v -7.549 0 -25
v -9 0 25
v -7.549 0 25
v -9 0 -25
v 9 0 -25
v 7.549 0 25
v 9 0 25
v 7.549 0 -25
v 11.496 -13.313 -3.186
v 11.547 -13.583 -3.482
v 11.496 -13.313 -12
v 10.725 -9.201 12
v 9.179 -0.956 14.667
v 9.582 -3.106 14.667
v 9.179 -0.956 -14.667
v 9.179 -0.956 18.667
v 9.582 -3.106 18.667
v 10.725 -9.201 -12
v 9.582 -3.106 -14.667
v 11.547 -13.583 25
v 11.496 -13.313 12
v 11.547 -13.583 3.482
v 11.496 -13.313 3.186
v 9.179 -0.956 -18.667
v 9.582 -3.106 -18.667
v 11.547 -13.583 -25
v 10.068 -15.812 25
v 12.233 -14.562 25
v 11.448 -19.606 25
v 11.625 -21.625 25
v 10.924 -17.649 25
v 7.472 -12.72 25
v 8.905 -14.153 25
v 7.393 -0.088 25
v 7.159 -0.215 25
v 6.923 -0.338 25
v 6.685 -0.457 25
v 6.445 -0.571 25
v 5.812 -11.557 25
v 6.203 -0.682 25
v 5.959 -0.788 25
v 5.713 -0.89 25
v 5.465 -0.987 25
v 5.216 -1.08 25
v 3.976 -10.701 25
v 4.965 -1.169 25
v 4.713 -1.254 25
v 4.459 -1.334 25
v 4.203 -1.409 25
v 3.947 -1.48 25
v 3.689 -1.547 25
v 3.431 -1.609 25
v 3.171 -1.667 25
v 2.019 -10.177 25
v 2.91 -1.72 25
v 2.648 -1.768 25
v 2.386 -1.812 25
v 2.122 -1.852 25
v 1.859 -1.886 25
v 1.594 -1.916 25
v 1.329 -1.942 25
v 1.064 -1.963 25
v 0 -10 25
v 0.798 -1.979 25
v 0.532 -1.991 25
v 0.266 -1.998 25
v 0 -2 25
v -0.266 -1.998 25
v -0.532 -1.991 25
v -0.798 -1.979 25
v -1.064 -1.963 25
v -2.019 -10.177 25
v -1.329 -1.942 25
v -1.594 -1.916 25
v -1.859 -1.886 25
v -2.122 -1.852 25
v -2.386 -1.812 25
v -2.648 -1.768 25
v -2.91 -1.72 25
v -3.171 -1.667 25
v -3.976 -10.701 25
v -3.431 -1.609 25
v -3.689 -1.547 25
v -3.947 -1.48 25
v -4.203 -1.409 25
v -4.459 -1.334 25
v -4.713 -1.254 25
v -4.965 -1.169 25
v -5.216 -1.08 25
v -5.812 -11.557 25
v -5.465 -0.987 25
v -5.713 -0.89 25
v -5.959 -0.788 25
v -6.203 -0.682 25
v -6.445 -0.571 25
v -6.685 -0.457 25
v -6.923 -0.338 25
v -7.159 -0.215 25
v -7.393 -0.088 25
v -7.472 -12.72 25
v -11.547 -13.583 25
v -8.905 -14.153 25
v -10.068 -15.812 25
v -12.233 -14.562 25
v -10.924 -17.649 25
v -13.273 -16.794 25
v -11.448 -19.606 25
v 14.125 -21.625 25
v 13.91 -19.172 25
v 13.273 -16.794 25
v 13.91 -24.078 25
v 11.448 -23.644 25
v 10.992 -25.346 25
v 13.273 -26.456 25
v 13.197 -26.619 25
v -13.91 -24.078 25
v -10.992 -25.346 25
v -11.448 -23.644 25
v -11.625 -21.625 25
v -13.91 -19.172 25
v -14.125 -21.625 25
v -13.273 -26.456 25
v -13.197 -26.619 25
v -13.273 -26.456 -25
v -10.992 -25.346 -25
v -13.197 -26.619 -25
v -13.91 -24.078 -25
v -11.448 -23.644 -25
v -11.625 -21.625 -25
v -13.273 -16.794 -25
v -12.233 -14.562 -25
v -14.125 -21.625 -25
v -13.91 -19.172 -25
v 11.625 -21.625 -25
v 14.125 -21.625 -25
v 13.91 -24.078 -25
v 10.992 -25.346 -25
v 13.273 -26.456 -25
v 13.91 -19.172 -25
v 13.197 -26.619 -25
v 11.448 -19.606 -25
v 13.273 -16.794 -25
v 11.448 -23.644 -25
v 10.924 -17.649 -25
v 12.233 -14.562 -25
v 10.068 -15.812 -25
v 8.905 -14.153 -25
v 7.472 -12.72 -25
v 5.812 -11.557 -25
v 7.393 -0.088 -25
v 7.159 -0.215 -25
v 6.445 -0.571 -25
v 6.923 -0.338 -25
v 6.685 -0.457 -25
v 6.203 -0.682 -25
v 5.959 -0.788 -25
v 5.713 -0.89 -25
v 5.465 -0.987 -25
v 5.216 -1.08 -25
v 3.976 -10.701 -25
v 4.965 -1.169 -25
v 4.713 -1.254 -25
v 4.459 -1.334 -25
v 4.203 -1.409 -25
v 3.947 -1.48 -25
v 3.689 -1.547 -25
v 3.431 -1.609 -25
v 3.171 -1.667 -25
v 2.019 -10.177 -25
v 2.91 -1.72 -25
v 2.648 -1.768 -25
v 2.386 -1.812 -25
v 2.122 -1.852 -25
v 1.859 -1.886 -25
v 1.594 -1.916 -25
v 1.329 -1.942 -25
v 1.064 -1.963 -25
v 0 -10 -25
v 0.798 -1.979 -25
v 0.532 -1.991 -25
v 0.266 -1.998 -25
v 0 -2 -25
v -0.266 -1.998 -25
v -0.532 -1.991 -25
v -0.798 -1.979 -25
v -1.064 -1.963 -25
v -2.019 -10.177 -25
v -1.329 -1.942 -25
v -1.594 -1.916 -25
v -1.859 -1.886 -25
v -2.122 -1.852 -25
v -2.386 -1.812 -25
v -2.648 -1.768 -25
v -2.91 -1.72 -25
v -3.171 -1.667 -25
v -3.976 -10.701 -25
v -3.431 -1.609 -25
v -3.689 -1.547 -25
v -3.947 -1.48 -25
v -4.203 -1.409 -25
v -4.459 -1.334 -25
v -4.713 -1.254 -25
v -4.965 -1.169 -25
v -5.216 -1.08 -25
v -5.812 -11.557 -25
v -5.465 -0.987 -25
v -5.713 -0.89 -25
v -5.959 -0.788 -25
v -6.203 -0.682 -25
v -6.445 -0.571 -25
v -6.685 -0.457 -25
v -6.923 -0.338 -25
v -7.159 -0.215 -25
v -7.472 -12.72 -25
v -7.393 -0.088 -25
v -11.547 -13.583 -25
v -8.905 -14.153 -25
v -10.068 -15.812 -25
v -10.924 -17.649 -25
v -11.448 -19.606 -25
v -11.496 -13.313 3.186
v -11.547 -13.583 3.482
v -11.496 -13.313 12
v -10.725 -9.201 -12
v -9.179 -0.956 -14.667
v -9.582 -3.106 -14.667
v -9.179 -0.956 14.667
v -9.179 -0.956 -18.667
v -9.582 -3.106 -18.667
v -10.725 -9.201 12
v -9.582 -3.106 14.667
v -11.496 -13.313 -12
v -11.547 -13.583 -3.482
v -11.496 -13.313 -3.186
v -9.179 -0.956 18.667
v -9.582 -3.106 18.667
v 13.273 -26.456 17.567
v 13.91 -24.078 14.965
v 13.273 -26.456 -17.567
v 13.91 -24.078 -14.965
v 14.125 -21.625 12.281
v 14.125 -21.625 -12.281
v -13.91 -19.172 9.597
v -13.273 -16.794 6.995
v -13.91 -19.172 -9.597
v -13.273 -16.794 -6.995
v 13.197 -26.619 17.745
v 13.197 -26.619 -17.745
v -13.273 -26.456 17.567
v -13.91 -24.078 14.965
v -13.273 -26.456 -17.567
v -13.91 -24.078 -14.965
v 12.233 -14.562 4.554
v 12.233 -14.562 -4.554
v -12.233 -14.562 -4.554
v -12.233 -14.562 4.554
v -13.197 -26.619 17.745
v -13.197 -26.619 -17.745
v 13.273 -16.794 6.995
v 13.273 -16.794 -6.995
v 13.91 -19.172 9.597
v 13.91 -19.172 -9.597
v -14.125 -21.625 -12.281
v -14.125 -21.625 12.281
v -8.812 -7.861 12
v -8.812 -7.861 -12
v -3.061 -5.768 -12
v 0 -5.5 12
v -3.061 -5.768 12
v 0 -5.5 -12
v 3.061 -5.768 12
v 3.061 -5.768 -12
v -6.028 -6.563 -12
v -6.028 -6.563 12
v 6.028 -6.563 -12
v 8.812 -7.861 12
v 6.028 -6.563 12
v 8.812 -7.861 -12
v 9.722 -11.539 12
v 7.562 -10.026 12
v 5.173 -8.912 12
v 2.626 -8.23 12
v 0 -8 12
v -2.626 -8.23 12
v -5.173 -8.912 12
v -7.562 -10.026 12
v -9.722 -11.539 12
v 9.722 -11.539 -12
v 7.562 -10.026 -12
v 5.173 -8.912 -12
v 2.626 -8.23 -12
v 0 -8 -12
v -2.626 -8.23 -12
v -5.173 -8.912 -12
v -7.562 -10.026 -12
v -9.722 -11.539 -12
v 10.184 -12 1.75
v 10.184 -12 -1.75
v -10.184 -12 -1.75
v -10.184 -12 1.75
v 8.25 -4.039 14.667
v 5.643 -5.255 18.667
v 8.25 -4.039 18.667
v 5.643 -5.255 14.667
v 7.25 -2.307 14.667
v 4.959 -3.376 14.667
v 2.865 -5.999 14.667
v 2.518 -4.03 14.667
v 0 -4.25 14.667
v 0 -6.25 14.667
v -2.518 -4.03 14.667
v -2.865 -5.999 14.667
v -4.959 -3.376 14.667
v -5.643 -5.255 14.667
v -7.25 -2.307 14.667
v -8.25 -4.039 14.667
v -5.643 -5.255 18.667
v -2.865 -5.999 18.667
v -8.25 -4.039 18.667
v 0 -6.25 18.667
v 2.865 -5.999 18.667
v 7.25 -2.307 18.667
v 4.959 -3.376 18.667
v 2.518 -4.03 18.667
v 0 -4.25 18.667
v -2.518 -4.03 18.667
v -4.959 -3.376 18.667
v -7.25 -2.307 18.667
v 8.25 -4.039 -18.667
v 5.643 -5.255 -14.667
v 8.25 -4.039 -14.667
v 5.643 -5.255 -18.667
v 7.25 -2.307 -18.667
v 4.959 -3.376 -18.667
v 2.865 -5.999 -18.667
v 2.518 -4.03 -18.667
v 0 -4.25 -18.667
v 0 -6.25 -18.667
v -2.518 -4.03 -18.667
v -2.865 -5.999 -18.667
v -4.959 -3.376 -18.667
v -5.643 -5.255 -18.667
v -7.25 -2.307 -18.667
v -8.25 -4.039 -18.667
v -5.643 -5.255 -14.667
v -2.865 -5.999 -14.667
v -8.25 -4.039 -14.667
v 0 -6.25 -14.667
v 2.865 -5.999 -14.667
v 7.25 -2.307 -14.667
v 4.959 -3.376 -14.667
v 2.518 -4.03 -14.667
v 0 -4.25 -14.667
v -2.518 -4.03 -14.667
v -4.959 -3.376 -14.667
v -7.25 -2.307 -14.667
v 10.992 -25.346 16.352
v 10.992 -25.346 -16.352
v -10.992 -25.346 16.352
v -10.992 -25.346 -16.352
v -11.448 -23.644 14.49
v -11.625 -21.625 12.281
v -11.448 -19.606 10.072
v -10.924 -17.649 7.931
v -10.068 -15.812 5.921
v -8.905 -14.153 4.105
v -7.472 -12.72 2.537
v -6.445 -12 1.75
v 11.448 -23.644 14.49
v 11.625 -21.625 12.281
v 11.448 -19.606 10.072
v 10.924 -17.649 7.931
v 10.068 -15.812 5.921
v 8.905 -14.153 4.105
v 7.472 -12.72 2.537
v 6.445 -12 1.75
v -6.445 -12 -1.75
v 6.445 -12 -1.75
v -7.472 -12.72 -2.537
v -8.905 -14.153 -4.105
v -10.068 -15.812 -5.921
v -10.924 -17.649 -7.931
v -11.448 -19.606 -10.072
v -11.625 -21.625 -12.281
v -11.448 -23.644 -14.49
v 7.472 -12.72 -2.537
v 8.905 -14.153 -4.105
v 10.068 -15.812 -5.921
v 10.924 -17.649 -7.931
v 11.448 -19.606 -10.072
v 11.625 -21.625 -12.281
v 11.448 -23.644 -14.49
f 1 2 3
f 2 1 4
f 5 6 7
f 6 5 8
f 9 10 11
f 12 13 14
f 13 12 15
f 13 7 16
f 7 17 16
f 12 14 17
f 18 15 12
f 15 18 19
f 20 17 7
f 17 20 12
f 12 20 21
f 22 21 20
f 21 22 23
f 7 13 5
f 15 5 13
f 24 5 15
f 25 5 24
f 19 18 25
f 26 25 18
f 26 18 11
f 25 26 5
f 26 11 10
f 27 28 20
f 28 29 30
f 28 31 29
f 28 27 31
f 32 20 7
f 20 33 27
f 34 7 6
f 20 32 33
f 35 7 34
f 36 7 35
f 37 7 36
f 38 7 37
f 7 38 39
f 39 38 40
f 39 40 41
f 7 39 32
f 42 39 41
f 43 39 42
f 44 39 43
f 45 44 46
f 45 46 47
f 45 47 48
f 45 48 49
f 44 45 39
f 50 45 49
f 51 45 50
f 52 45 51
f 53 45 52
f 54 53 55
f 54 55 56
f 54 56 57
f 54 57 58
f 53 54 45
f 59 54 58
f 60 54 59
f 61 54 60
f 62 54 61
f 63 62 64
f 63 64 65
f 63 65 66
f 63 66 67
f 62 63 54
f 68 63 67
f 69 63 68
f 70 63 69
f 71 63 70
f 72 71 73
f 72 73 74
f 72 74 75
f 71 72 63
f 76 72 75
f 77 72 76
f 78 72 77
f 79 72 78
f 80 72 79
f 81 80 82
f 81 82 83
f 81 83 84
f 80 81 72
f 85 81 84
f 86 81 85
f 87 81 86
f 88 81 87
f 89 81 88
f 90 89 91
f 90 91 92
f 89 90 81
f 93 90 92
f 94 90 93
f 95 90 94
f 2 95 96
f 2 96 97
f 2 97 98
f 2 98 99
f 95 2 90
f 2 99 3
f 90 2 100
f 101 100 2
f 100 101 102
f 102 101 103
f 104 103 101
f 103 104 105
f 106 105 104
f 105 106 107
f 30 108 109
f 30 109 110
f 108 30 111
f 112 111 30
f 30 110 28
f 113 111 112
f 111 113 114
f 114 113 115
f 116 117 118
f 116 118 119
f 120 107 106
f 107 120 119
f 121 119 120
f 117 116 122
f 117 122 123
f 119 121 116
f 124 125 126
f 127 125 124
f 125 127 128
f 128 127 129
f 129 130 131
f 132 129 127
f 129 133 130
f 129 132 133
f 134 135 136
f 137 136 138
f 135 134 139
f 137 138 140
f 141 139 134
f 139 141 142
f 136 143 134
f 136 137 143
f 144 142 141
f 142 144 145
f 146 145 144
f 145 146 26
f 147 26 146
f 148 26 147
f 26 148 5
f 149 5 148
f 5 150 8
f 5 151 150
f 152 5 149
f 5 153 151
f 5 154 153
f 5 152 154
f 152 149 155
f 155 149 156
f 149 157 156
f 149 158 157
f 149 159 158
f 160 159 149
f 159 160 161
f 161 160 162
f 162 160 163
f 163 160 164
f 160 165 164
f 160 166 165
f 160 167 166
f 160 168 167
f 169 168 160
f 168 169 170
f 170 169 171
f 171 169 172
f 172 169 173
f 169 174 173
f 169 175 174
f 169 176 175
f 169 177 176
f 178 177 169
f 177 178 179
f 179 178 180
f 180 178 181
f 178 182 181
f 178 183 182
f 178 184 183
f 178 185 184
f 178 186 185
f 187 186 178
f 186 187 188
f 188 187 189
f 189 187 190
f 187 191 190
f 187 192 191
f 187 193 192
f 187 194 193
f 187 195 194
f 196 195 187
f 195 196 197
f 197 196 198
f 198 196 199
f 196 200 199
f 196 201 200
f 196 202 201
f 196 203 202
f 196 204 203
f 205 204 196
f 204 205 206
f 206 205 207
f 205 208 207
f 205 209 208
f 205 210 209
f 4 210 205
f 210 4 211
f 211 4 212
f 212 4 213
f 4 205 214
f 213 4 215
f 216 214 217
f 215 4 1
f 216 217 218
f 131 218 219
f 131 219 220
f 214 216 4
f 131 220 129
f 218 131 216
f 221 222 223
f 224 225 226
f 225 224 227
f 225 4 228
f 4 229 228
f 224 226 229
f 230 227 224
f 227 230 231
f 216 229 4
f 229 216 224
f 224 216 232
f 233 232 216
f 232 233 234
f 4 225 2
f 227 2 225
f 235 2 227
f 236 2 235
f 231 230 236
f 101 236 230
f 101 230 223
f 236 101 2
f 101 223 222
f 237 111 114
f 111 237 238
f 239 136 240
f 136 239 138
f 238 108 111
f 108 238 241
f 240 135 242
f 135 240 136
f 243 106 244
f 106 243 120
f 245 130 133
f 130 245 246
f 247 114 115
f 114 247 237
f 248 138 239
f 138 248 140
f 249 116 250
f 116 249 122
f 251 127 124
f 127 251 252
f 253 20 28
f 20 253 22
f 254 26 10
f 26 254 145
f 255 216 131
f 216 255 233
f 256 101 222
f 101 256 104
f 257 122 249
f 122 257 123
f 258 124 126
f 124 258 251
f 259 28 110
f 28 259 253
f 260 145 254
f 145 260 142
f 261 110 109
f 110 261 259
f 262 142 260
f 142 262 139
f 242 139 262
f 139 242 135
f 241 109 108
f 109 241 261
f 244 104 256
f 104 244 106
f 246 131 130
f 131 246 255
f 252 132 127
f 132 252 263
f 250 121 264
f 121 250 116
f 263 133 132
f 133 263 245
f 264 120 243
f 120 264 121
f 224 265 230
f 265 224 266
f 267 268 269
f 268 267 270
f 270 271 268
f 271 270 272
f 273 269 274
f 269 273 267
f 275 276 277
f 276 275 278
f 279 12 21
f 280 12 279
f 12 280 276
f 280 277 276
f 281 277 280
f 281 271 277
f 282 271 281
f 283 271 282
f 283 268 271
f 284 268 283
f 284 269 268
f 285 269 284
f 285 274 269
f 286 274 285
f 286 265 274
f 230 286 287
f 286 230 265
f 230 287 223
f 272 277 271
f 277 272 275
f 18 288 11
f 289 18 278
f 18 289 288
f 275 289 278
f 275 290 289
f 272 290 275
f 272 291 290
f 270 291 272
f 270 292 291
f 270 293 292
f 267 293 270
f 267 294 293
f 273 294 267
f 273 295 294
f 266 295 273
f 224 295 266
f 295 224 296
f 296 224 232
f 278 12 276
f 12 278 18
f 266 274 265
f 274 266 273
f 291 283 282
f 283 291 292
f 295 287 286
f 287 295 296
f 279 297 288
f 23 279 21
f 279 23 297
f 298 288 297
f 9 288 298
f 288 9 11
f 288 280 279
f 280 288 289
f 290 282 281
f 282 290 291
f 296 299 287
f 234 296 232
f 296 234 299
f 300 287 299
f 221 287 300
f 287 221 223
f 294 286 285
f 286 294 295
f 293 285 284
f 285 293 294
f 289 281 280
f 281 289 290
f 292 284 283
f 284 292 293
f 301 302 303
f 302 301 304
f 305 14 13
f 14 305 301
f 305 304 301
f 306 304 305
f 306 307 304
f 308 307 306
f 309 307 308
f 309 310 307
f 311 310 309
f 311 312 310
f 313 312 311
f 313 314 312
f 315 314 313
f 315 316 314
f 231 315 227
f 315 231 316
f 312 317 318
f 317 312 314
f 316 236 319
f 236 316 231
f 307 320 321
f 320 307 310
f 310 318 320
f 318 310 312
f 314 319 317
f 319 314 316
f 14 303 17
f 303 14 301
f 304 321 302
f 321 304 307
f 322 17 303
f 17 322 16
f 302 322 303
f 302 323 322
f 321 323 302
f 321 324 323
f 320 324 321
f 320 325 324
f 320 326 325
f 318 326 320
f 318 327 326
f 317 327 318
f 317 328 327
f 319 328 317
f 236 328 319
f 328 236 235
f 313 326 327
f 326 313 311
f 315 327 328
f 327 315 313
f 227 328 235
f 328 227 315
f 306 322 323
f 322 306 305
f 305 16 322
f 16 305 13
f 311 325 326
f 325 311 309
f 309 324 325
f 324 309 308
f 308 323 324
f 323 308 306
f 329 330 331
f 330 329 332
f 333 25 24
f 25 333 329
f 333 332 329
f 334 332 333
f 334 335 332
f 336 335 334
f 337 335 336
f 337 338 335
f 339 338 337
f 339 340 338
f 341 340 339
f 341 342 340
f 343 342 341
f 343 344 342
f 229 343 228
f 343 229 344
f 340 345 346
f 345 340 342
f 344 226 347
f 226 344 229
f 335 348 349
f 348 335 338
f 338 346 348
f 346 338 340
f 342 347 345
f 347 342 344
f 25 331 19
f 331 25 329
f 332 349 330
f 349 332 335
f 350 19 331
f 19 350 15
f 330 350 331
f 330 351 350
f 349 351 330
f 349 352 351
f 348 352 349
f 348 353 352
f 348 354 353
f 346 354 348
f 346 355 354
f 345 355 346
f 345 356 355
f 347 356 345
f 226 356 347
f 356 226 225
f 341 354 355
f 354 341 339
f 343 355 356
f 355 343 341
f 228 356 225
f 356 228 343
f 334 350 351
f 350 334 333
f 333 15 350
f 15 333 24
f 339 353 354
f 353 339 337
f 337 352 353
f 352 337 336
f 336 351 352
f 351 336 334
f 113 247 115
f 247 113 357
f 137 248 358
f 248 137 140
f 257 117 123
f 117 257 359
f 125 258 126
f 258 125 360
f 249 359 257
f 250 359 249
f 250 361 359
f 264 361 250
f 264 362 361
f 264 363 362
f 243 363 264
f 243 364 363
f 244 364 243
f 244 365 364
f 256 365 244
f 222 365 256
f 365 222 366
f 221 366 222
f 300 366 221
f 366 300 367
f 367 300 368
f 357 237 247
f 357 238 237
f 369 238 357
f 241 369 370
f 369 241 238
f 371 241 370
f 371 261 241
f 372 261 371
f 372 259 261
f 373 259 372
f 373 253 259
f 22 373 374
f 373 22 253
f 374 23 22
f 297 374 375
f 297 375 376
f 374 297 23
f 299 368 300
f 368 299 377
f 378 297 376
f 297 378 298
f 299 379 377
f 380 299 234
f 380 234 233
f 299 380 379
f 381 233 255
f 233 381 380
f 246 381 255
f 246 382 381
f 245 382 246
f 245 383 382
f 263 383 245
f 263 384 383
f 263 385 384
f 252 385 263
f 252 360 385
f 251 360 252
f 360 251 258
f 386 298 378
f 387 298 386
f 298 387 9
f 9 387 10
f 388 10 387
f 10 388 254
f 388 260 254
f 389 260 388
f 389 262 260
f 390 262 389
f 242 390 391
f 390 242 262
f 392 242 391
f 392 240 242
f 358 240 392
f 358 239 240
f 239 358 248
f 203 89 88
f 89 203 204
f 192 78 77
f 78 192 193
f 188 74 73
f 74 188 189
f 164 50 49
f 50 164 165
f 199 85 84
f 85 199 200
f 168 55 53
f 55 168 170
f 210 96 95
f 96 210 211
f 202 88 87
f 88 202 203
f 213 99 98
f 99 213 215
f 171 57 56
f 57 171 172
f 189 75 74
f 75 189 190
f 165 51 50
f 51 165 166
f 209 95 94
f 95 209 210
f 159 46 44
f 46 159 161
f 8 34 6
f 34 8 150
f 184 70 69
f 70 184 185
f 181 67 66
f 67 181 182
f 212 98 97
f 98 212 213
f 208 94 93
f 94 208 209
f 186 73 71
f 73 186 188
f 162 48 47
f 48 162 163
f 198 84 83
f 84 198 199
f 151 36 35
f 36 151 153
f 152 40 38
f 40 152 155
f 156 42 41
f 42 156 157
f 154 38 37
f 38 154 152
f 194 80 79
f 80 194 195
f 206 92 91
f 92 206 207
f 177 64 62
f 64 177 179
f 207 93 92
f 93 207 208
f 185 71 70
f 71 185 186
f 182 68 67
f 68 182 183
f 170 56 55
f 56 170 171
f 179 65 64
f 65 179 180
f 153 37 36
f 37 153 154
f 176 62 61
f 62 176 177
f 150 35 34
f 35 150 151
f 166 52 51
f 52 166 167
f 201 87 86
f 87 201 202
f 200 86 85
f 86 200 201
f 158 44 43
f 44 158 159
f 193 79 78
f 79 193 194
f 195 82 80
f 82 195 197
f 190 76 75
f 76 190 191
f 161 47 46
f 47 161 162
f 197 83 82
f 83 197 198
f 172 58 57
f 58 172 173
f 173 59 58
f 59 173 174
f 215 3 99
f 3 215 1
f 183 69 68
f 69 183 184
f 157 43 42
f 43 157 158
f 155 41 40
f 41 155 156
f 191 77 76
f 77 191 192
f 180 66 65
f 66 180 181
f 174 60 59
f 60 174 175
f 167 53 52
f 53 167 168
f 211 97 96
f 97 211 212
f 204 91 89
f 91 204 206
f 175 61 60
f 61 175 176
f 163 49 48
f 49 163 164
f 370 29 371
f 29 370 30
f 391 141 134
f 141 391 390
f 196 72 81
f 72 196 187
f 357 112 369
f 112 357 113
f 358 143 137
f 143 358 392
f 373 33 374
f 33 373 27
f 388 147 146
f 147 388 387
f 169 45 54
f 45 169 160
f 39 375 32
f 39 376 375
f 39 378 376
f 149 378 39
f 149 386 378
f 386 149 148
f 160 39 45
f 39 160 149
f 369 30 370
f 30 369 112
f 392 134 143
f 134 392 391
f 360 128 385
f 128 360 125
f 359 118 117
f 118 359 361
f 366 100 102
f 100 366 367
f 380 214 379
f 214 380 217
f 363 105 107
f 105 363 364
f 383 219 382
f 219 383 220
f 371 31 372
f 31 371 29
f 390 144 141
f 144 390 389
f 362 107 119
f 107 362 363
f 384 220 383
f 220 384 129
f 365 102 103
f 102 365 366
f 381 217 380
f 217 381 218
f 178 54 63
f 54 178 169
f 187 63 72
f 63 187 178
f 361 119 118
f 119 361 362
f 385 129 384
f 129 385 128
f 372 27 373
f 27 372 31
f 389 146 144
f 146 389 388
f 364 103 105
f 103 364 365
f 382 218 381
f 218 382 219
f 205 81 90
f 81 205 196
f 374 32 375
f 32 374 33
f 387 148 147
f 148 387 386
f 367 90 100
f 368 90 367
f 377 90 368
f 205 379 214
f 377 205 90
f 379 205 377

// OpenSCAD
use <BezierScad.scad>
$fn = 36;

len = 50;
pumpD = 23.25;
insertD = 10;
insertOffset = 38;
wid = 15;
hgt = 10;

rotate([90,0,0]) difference() {
	base();
	translate([0,0,hgt+(pumpD/2)]) rotate([90,0,0]) cylinder(r=pumpD/2, h=len+2, center=true);
}
zipD = 33;
module zip(args) {
    rotate([90,0,0]) difference() {
        cylinder(d=zipD, h=4, center=true);
        cylinder(d=zipD-4, h=4, center=true);
    }
}

module base() {
	difference() {
		union() {
			rotate([90,0,0])
				linear_extrude(len, center=true) polygon(
					points=[
					[-insertD/2-4, 0],
					[insertD/2+4, 0],
					[pumpD/2, hgt+4],
					[-pumpD/2, hgt+4],
					]
				);
			translate([0,0,hgt+(pumpD/2)]) rotate([90,0,0]) cylinder(r=2.5+pumpD/2, h=len, center=true);
		}
	translate([0,0,14+hgt+(pumpD/2)]) rotate([90,0,0]) rotate([0,0,360/12]) cylinder(r=5+pumpD/2, h=len+1, center=true, $fn=6);
	rotate([90,0,90]) linear_extrude(pumpD*2, center=true) polygon(points=[
		[-len/2 + pumpD,hgt+2],
		[len/2 - pumpD,hgt+2],
		[len/2, hgt+pumpD],
		[-len/2, hgt+pumpD],
	]);
	translate([0,0,hgt+1.5+pumpD/2])
		rotate([90,0,0]) {
			difference() {
				cylinder(r=6+pumpD/2, h=24, center=true);
				cylinder(r=3.5+pumpD/2, h=25, center=true);
			}
		}
	translate([0,0,-30.5/2+2]) rotate([90,0,0]) cylinder(d=30.5, h = len+2, center=true, $fn=360);
	translate([0,len/3,-30.5/2+5]) zip();
	translate([0,-len/3,-30.5/2+5]) zip();
	}
}

module screwCutout(yOffset) {
	translate([0,yOffset,0]) {
		translate([0,0,hgt/2]) cylinder(r=5/2, h=hgt+2, center=true);
		translate([0,0,-0.1]) cylinder(r=(insertD/2)/cos(180/8), h=2, center=false, $fn=8);
		translate([0,0,6]) cylinder(r=(10/2)/cos(180/8), h=10, center=false, $fn=8);
	}
}
